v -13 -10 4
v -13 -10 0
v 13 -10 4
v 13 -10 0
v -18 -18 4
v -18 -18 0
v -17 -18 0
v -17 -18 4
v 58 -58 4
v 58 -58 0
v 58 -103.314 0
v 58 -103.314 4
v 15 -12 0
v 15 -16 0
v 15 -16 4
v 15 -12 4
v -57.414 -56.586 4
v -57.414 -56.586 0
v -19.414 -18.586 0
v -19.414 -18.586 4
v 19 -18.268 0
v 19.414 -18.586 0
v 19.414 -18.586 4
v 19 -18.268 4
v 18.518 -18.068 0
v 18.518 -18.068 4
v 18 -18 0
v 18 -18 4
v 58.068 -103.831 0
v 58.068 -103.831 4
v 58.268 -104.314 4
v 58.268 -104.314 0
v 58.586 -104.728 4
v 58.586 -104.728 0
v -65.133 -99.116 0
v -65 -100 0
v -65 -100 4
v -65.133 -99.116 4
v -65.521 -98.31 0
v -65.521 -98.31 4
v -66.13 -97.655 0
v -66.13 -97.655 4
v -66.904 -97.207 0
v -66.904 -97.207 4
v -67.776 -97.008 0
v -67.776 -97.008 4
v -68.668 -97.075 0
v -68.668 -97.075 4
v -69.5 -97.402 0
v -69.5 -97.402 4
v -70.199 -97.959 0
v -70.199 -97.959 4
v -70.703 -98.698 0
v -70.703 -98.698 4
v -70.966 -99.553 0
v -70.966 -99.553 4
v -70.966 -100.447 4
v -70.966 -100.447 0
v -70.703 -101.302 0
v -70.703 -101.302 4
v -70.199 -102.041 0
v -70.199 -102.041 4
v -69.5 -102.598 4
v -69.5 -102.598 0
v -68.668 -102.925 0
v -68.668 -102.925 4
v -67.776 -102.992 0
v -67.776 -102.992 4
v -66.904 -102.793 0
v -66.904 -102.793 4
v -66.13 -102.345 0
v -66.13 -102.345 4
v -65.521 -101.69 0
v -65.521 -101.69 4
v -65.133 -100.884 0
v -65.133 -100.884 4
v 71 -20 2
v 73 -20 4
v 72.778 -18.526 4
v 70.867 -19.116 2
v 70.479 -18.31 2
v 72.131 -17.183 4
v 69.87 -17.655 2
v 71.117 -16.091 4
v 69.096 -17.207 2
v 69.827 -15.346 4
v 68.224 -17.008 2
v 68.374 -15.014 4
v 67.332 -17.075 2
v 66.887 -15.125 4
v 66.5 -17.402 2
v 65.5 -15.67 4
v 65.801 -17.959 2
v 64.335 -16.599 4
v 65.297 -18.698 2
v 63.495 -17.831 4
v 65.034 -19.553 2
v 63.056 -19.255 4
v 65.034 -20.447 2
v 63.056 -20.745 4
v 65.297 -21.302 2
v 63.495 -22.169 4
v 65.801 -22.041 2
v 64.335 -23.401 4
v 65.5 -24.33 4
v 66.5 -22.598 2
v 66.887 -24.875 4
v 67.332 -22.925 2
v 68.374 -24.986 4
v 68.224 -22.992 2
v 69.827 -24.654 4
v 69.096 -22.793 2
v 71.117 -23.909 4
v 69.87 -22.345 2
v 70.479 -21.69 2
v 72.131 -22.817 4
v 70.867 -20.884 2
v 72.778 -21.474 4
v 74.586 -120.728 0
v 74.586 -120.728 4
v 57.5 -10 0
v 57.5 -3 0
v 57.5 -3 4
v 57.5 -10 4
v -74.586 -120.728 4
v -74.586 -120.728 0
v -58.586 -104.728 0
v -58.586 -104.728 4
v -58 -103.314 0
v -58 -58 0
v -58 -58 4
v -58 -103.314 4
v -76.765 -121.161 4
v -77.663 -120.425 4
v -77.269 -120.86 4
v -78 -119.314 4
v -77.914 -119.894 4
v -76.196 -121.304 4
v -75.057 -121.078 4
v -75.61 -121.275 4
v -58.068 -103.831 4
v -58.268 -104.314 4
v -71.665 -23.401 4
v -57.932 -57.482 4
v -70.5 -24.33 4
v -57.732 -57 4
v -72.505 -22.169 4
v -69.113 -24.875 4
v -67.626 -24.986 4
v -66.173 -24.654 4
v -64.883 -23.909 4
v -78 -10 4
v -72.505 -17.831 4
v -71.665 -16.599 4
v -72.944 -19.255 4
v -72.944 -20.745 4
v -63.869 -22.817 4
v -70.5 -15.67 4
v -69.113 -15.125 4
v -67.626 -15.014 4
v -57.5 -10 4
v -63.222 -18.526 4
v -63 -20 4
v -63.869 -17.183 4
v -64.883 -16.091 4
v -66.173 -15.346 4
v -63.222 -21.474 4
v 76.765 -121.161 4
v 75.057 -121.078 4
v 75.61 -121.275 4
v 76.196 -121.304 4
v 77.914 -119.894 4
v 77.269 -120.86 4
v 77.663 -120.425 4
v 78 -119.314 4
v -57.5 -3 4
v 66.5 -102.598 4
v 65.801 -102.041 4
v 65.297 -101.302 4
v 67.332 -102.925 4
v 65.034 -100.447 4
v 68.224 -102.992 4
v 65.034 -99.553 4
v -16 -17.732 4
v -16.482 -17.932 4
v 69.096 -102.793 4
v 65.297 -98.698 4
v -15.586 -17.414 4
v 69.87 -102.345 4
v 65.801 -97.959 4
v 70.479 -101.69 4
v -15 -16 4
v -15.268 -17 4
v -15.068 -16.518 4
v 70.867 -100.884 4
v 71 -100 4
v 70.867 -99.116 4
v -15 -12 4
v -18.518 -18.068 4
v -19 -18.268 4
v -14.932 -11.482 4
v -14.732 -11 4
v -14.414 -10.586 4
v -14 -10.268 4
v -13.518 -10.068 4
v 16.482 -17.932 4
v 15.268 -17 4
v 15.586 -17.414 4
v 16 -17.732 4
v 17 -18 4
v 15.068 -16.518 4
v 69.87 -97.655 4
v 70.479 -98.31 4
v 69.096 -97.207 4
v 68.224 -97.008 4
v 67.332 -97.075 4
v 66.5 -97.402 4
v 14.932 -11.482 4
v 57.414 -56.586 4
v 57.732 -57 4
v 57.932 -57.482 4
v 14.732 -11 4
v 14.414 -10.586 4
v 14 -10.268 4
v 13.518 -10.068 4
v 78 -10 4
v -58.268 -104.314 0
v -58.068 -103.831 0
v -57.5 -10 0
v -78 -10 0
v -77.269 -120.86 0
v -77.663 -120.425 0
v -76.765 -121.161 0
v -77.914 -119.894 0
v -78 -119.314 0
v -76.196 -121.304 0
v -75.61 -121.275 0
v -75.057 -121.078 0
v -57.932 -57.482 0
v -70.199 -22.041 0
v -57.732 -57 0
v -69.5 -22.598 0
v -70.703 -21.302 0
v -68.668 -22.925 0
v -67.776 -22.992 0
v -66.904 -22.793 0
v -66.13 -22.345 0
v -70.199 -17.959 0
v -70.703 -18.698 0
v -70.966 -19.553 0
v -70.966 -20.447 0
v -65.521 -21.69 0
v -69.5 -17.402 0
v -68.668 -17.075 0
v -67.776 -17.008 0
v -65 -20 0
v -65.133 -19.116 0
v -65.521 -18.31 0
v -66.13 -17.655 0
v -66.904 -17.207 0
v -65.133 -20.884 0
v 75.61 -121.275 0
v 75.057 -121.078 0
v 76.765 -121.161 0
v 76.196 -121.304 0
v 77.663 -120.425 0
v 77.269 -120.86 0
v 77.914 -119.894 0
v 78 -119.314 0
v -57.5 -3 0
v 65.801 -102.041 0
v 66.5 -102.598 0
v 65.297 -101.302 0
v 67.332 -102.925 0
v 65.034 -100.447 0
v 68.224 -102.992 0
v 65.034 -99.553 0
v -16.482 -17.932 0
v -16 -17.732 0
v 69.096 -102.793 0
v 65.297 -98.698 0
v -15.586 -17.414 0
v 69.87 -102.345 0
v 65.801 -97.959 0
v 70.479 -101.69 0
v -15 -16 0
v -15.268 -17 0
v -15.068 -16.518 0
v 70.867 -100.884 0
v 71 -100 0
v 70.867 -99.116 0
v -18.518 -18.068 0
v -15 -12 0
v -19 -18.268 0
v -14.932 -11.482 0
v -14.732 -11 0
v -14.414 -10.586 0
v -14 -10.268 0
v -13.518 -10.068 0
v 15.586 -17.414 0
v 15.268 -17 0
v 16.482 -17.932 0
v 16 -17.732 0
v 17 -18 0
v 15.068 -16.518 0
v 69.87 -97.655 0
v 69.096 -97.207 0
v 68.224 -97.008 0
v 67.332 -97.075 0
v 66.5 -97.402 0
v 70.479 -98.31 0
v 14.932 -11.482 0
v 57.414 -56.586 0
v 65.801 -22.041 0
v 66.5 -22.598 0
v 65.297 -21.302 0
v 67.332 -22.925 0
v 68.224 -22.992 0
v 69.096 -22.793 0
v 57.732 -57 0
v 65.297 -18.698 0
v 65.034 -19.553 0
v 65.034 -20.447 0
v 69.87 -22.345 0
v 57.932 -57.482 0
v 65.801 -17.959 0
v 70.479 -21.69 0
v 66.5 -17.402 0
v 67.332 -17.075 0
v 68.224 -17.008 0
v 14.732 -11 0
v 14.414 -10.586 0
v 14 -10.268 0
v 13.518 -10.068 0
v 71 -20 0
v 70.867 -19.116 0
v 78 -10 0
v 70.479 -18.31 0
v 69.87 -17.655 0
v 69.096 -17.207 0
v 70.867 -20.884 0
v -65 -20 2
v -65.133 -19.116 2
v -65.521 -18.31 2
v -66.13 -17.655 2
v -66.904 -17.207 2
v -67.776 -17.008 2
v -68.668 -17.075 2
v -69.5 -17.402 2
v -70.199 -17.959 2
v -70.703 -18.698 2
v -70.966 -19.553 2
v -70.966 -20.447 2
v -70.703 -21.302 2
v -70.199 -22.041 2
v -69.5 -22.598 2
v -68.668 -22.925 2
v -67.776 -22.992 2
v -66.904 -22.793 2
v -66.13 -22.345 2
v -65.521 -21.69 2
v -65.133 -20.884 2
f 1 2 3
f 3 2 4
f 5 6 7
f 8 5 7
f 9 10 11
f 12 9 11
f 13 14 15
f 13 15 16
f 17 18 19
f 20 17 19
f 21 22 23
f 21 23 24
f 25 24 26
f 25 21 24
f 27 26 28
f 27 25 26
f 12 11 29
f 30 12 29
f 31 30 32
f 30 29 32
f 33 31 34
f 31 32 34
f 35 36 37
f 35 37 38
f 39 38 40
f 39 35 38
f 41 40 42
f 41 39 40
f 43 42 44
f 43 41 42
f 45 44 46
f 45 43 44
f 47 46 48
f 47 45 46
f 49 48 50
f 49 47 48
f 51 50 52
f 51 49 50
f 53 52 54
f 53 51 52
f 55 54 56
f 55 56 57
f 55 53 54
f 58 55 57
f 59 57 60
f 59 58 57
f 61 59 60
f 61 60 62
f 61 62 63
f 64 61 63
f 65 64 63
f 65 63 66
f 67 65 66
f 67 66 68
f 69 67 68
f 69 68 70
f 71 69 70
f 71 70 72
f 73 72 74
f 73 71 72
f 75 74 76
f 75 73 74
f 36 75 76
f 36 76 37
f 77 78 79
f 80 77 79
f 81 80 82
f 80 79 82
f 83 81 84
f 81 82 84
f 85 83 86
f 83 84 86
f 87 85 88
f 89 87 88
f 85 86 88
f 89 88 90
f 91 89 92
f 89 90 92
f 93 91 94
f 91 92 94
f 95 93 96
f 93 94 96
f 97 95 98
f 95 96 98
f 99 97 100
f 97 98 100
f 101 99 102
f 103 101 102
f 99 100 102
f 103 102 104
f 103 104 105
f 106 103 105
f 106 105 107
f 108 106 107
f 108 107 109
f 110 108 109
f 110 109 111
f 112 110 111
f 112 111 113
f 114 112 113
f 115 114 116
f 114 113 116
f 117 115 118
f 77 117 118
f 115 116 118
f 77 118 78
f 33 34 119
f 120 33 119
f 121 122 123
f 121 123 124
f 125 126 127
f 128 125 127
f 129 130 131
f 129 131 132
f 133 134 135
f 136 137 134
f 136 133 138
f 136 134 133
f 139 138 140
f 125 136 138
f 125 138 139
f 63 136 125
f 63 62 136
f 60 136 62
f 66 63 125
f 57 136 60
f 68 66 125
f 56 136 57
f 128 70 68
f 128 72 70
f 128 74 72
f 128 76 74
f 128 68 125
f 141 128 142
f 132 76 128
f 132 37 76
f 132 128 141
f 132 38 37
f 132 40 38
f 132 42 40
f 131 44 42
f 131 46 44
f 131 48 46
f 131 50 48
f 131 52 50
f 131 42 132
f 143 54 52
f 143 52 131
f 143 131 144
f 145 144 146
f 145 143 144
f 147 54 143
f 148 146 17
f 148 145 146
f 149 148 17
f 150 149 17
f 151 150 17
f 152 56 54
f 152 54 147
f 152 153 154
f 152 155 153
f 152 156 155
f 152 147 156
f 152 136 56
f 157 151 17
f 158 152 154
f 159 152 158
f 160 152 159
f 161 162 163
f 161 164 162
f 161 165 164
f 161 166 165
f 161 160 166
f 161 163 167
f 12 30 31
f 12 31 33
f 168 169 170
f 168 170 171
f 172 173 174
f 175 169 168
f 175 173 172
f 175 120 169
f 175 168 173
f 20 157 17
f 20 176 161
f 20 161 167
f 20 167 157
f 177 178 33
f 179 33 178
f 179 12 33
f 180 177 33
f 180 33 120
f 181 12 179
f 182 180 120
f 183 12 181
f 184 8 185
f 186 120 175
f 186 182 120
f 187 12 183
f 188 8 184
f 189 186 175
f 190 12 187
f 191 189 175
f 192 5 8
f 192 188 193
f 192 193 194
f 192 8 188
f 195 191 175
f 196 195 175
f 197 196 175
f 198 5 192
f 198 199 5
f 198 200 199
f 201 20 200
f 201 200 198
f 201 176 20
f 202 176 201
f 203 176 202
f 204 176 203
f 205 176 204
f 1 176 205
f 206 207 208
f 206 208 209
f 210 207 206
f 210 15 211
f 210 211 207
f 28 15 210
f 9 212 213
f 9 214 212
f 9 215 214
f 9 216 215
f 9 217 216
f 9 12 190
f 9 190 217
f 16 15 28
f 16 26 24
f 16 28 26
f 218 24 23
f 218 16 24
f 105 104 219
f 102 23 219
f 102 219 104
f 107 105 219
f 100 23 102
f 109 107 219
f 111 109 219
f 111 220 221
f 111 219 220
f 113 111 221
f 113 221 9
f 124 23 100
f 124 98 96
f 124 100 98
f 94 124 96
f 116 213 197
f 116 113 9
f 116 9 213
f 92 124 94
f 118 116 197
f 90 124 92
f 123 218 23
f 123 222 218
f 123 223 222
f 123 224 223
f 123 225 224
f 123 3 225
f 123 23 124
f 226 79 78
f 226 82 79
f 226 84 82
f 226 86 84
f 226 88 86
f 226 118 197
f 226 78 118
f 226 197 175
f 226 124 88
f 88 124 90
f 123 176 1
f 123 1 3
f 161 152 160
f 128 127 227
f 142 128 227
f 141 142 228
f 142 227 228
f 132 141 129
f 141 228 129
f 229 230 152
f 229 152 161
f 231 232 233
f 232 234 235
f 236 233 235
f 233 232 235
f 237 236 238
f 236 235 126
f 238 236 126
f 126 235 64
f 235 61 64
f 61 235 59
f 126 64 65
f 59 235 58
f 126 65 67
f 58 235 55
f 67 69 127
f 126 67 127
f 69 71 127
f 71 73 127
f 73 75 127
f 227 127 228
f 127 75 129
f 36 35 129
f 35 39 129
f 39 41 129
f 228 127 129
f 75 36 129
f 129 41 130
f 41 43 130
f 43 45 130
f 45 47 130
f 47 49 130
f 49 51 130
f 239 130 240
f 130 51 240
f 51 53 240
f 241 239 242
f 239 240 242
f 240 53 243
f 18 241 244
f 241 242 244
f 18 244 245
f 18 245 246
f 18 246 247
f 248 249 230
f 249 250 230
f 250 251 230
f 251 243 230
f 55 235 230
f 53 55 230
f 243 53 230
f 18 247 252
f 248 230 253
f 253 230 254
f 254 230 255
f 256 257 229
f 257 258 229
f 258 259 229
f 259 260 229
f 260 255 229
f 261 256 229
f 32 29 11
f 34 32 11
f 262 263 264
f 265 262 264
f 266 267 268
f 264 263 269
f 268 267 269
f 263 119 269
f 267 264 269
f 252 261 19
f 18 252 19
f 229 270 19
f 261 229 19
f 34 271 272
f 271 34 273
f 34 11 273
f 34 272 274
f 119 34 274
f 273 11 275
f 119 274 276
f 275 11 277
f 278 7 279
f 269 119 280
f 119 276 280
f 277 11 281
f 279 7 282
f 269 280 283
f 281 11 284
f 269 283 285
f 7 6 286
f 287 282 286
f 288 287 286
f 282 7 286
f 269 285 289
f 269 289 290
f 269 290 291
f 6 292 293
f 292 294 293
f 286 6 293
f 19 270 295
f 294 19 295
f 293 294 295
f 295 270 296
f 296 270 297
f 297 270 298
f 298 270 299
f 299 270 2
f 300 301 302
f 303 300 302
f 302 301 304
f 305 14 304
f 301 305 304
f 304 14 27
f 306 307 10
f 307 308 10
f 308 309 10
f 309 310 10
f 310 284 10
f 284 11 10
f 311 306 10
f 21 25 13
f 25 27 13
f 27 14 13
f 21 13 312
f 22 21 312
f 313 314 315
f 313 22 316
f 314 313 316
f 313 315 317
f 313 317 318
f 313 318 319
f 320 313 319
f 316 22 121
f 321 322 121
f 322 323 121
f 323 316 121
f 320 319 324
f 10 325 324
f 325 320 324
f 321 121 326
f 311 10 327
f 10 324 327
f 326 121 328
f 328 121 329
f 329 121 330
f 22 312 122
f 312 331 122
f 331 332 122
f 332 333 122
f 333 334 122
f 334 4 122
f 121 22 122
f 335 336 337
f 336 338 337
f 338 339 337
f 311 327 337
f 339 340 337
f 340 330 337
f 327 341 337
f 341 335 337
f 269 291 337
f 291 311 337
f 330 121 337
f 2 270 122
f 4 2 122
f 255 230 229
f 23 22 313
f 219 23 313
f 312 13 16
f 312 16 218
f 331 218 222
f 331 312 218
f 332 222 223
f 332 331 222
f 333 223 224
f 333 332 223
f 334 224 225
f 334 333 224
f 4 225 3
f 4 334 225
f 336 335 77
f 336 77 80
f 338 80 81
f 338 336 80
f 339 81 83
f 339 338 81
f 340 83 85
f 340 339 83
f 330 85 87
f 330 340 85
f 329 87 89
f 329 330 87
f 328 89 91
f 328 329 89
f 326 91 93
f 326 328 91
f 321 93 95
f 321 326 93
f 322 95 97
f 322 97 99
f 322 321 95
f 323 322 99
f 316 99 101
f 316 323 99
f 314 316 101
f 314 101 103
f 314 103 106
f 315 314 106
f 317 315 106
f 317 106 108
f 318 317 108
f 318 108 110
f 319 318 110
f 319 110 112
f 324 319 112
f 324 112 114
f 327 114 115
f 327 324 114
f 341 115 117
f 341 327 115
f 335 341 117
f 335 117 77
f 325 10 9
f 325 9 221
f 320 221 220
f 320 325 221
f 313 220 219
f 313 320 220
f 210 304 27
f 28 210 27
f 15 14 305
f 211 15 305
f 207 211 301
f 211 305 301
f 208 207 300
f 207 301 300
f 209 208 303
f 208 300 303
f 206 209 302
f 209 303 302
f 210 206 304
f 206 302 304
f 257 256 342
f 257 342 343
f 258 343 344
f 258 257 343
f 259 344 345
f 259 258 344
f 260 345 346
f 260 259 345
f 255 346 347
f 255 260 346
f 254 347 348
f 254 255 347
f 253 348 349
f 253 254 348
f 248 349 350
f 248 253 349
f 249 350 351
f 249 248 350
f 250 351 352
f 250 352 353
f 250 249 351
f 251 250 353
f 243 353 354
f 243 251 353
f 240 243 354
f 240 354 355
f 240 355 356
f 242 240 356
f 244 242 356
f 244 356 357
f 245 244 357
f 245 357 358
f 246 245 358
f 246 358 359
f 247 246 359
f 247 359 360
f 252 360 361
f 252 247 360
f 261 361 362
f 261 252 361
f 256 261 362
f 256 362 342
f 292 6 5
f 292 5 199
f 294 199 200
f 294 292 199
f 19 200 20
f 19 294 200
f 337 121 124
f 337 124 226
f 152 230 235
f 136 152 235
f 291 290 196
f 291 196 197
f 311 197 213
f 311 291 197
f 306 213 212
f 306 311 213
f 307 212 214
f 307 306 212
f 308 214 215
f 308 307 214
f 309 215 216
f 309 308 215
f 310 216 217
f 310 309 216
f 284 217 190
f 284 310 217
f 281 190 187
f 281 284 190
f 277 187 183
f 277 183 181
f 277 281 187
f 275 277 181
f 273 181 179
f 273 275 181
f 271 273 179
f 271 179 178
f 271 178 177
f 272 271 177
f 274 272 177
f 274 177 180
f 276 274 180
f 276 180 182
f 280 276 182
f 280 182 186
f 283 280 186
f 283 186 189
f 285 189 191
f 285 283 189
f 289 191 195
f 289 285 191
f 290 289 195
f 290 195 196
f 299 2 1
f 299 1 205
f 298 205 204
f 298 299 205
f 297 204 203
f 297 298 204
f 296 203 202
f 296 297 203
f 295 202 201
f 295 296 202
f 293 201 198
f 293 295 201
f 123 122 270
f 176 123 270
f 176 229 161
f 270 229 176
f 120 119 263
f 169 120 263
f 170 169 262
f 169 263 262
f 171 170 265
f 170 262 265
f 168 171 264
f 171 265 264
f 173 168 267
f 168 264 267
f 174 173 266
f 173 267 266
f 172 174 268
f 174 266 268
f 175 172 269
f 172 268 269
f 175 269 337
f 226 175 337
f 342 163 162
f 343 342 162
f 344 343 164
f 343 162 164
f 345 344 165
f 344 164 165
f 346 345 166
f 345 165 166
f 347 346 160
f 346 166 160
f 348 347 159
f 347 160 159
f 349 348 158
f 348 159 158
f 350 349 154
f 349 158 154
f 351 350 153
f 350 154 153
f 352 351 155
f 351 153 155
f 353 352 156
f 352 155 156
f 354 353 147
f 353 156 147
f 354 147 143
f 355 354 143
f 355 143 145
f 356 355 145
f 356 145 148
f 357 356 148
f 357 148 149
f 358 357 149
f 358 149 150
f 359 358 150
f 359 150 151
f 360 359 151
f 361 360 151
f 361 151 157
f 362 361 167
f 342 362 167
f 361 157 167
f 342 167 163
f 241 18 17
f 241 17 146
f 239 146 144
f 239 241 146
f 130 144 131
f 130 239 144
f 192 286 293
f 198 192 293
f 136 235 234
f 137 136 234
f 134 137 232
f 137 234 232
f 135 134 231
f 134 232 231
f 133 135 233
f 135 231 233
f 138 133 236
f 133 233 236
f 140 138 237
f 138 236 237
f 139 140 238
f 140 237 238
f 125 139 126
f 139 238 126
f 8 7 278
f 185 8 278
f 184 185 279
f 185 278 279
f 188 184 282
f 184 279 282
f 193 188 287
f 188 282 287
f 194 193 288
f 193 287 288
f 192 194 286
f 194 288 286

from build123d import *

# Parameters (mm, degrees)
SKETCH_R     = 3
PAD_DEPTH    = 4
CHAMFER_SIZE = 2


with BuildPart() as part:
    # Sketch → Pad (new body)
    with BuildSketch(Plane.XY):
        with BuildLine():
            Line((-78, -10), (-78, -119.313708))
            ThreePointArc((-78, -119.313708), (-76.765367, -121.161468), (-74.585786, -120.727922))
            Line((-74.585786, -120.727922), (-58.585786, -104.727922))
            ThreePointArc((-58.585786, -104.727922), (-58.152241, -104.079075), (-58, -103.313708))
            Line((-58, -58), (-58, -103.313708))
            ThreePointArc((-57.414214, -56.585786), (-57.847759, -57.234633), (-58, -58))
            Line((-57.414214, -56.585786), (-19.414214, -18.585786))
            ThreePointArc((-18, -18), (-18.765367, -18.152241), (-19.414214, -18.585786))
            Line((-18, -18), (-17, -18))
            ThreePointArc((-17, -18), (-15.585786, -17.414214), (-15, -16))
            Line((-15, -16), (-15, -12))
            ThreePointArc((-13, -10), (-14.414214, -10.585786), (-15, -12))
            Line((-13, -10), (13, -10))
            ThreePointArc((15, -12), (14.414214, -10.585786), (13, -10))
            Line((15, -16), (15, -12))
            ThreePointArc((15, -16), (15.585786, -17.414214), (17, -18))
            Line((17, -18), (18, -18))
            ThreePointArc((19.414214, -18.585786), (18.765367, -18.152241), (18, -18))
            Line((19.414214, -18.585786), (57.414214, -56.585786))
            ThreePointArc((58, -58), (57.847759, -57.234633), (57.414214, -56.585786))
            Line((58, -58), (58, -103.313708))
            ThreePointArc((58, -103.313708), (58.152241, -104.079075), (58.585786, -104.727922))
            Line((58.585786, -104.727922), (74.585786, -120.727922))
            ThreePointArc((74.585786, -120.727922), (76.765367, -121.161468), (78, -119.313708))
            Line((78, -119.313708), (78, -10))
            Line((57.5, -10), (78, -10))
            Line((57.5, -3), (57.5, -10))
            Line((57.5, -3), (-57.5, -3))
            Line((-57.5, -10), (-57.5, -3))
            Line((-78, -10), (-57.5, -10))
        make_face()
        with Locations((-68, -20)):
            Circle(SKETCH_R, mode=Mode.SUBTRACT)
        with Locations((-68, -100)):
            Circle(SKETCH_R, mode=Mode.SUBTRACT)
        with Locations((68, -20)):
            Circle(SKETCH_R, mode=Mode.SUBTRACT)
        with Locations((68, -100)):
            Circle(SKETCH_R, mode=Mode.SUBTRACT)
    extrude(amount=PAD_DEPTH)

    # Chamfer
    chamfer_edges = [part.edges().sort_by_distance(p)[0] for p in [
        (-71, -20, 4),
        (65, -20, 4),
    ]]
    chamfer(chamfer_edges, length=CHAMFER_SIZE)


solid = part.part
